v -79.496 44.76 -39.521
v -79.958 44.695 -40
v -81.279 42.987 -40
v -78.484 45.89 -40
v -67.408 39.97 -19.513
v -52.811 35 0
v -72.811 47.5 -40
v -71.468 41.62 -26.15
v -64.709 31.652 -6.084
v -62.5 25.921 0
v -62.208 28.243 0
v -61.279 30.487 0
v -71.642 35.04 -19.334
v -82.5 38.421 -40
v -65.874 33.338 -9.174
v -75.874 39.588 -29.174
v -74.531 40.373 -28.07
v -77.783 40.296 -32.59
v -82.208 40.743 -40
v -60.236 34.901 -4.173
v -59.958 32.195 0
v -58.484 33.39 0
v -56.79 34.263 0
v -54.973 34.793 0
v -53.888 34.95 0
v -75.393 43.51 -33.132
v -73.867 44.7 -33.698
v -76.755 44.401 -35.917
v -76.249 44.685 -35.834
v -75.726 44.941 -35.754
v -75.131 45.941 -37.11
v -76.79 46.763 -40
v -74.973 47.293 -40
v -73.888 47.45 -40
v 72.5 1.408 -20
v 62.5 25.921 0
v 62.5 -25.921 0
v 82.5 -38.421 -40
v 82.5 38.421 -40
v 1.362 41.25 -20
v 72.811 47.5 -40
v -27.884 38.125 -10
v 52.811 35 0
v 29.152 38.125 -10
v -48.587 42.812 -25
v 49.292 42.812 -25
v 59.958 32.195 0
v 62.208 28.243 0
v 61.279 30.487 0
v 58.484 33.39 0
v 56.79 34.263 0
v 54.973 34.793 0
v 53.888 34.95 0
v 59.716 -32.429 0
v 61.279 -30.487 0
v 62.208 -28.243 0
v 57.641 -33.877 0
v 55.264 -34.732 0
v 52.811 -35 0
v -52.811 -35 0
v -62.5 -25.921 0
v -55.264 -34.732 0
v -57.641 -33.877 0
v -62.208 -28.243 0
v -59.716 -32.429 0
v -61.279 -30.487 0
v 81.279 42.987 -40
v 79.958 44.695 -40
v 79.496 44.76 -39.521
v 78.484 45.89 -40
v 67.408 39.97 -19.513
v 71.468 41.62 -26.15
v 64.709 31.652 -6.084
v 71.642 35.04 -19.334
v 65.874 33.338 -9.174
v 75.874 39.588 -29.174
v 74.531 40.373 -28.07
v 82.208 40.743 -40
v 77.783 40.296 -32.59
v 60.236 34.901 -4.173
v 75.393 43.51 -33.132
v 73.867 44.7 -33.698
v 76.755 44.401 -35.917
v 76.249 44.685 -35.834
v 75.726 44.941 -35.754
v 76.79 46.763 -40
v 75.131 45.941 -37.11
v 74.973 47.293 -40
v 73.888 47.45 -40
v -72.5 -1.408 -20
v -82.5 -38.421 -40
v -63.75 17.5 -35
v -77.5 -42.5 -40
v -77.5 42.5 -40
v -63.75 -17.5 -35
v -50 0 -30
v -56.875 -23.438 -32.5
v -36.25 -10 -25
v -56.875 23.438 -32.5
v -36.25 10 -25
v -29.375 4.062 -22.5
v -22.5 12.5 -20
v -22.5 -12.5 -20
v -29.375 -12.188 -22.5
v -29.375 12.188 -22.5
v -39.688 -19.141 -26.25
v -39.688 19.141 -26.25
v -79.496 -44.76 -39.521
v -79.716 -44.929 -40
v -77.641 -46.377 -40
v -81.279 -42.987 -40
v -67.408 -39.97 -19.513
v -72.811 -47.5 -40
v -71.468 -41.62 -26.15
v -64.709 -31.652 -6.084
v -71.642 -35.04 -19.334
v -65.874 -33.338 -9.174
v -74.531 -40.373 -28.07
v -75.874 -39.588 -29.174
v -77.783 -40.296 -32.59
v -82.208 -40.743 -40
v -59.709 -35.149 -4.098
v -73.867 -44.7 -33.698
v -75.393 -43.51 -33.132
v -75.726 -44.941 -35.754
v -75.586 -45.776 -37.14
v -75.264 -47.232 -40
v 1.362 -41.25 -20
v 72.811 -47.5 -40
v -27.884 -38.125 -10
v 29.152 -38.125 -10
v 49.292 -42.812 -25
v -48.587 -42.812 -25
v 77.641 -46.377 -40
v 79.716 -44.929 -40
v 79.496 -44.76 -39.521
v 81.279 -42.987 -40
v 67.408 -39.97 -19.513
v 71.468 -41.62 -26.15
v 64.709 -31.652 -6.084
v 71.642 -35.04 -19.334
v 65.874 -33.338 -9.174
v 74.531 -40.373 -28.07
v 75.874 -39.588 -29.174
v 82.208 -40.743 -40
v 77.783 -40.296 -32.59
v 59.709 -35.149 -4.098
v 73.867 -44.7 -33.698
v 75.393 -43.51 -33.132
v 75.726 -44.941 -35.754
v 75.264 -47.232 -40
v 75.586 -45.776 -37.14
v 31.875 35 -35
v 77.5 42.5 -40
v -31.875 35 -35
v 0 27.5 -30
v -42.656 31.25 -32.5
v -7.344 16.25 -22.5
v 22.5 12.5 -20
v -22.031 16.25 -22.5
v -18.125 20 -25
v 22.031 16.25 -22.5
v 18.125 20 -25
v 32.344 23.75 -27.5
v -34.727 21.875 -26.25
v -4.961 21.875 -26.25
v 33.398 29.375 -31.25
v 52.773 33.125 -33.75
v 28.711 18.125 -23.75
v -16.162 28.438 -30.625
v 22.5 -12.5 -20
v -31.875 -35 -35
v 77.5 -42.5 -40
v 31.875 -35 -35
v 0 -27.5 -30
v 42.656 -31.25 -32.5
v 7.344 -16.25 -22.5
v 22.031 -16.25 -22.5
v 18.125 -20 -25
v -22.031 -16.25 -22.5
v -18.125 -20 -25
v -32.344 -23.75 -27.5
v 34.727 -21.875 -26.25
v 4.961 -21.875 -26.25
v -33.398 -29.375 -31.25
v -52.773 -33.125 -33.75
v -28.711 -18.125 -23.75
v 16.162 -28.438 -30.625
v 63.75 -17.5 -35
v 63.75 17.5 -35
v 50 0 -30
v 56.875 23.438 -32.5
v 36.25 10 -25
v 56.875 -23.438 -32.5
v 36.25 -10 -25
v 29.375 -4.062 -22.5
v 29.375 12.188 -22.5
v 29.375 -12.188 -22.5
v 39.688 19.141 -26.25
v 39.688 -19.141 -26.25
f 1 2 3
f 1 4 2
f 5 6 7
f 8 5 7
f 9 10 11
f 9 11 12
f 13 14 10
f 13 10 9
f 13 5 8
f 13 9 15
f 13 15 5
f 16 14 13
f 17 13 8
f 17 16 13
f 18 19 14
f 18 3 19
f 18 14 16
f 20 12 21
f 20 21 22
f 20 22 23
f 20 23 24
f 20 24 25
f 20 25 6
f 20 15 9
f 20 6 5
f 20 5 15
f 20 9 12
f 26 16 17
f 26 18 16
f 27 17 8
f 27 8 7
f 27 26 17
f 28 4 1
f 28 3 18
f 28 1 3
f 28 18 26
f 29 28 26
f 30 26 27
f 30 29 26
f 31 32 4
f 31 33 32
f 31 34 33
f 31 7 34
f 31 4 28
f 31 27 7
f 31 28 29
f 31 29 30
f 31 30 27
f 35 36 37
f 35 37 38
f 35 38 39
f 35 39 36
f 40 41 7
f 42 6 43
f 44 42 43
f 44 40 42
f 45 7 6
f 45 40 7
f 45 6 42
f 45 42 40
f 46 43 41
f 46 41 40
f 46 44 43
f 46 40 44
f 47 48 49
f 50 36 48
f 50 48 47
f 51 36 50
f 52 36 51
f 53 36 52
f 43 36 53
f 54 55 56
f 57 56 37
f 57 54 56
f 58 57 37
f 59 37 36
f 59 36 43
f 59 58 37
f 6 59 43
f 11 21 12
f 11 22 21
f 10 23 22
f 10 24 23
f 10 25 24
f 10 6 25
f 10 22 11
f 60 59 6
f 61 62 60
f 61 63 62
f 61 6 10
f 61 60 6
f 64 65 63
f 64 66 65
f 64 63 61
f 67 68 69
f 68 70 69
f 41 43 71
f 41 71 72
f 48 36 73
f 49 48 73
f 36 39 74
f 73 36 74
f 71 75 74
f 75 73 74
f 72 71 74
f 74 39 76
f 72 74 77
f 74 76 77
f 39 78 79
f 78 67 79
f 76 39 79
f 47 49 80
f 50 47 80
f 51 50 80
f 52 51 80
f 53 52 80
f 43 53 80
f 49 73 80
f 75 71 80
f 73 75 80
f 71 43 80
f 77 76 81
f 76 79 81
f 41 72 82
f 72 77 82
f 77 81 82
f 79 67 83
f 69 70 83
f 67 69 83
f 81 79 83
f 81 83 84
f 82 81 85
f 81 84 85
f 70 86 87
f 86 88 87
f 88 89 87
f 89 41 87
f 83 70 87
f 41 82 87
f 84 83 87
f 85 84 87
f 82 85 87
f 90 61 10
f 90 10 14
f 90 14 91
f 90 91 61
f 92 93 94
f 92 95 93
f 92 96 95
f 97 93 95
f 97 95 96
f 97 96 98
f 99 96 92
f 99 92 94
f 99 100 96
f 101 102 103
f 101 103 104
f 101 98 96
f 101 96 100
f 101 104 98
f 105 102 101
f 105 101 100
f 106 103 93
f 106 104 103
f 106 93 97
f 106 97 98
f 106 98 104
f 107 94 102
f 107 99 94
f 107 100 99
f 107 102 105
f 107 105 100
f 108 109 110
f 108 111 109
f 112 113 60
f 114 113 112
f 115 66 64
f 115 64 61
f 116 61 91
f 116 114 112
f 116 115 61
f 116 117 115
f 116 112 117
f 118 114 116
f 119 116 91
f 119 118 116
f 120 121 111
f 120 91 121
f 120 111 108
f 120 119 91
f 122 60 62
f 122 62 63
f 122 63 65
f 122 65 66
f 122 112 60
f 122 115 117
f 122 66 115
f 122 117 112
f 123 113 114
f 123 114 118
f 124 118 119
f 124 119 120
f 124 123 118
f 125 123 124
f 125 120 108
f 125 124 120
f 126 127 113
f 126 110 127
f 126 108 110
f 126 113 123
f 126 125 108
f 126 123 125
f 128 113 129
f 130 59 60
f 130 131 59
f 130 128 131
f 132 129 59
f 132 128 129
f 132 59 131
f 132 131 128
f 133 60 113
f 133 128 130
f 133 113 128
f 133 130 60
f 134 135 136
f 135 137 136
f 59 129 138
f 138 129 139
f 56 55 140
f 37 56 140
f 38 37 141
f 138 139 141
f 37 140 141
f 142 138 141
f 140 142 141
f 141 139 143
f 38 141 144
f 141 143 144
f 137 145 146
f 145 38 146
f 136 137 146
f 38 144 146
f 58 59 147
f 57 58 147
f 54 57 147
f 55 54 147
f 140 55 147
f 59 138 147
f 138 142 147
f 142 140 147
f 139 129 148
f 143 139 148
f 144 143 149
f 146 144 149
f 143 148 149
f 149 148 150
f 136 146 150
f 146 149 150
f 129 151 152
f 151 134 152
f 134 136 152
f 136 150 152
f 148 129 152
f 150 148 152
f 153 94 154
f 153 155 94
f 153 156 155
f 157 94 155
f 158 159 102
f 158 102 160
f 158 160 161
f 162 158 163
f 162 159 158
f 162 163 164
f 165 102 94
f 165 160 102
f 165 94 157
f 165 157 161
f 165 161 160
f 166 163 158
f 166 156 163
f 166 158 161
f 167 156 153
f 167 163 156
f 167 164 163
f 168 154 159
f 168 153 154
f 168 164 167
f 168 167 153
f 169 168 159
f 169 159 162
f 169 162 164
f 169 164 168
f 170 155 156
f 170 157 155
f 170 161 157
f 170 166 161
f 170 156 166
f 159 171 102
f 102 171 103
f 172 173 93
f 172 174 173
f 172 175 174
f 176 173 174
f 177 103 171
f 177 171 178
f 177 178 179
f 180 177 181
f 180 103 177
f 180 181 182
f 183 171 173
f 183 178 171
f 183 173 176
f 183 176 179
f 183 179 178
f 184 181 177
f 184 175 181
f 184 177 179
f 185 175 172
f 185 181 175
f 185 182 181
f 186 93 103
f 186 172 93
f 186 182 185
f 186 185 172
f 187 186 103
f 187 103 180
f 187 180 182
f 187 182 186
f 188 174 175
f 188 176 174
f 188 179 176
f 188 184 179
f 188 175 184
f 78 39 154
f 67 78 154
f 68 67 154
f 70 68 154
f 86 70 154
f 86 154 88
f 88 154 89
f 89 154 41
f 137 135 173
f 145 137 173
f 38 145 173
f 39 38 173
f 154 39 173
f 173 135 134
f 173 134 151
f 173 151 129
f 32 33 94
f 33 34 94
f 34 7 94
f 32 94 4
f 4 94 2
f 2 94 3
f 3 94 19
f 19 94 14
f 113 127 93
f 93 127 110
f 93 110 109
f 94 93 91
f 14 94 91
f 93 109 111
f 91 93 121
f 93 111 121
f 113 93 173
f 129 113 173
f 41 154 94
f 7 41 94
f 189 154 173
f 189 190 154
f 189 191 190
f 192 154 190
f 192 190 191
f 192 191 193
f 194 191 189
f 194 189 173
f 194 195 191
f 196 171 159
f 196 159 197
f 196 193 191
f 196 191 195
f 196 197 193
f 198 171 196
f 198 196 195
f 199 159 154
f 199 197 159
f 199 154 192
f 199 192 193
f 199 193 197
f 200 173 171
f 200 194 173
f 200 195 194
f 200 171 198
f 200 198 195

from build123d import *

# Parameters (mm, degrees)
FILLET1_R = 10


with BuildPart() as part:
    # Sketch3 → Loft1 section 0
    with BuildSketch(Plane.XY):
        with BuildLine():
            Line((62.5, -35), (-62.5, -35))
            Line((-62.5, -35), (-62.5, 35))
            Line((-62.5, 35), (62.5, 35))
            Line((62.5, 35), (62.5, -35))
        make_face()
    # Sketch4 → Loft1 section 1
    with BuildSketch(Plane.XY.offset(-40)):
        with BuildLine():
            Line((82.5, -47.5), (-82.5, -47.5))
            Line((-82.5, -47.5), (-82.5, 47.5))
            Line((-82.5, 47.5), (82.5, 47.5))
            Line((82.5, 47.5), (82.5, -47.5))
        make_face()
    loft()

    # Sketch7 → Cut-Loft2 section 0
    with BuildSketch(Plane.XY.offset(-40)):
        with BuildLine():
            Line((77.5, -42.5), (-77.5, -42.5))
            Line((-77.5, -42.5), (-77.5, 42.5))
            Line((-77.5, 42.5), (77.5, 42.5))
            Line((77.5, 42.5), (77.5, -42.5))
        make_face()
    # Sketch5 → Cut-Loft2 section 1
    with BuildSketch(Plane.XY.offset(-20)):
        with BuildLine():
            Line((22.5, -12.5), (-22.5, -12.5))
            Line((-22.5, -12.5), (-22.5, 12.5))
            Line((-22.5, 12.5), (22.5, 12.5))
            Line((22.5, 12.5), (22.5, -12.5))
        make_face()
    loft(mode=Mode.SUBTRACT)

    # Fillet1
    fillet1_edges = [part.edges().sort_by_distance(p)[0] for p in [
        (-72.5, -41.25, -20),
        (-72.5, 41.25, -20),
        (72.5, -41.25, -20),
        (72.5, 41.25, -20),
    ]]
    fillet(fillet1_edges, radius=FILLET1_R)


solid = part.part
